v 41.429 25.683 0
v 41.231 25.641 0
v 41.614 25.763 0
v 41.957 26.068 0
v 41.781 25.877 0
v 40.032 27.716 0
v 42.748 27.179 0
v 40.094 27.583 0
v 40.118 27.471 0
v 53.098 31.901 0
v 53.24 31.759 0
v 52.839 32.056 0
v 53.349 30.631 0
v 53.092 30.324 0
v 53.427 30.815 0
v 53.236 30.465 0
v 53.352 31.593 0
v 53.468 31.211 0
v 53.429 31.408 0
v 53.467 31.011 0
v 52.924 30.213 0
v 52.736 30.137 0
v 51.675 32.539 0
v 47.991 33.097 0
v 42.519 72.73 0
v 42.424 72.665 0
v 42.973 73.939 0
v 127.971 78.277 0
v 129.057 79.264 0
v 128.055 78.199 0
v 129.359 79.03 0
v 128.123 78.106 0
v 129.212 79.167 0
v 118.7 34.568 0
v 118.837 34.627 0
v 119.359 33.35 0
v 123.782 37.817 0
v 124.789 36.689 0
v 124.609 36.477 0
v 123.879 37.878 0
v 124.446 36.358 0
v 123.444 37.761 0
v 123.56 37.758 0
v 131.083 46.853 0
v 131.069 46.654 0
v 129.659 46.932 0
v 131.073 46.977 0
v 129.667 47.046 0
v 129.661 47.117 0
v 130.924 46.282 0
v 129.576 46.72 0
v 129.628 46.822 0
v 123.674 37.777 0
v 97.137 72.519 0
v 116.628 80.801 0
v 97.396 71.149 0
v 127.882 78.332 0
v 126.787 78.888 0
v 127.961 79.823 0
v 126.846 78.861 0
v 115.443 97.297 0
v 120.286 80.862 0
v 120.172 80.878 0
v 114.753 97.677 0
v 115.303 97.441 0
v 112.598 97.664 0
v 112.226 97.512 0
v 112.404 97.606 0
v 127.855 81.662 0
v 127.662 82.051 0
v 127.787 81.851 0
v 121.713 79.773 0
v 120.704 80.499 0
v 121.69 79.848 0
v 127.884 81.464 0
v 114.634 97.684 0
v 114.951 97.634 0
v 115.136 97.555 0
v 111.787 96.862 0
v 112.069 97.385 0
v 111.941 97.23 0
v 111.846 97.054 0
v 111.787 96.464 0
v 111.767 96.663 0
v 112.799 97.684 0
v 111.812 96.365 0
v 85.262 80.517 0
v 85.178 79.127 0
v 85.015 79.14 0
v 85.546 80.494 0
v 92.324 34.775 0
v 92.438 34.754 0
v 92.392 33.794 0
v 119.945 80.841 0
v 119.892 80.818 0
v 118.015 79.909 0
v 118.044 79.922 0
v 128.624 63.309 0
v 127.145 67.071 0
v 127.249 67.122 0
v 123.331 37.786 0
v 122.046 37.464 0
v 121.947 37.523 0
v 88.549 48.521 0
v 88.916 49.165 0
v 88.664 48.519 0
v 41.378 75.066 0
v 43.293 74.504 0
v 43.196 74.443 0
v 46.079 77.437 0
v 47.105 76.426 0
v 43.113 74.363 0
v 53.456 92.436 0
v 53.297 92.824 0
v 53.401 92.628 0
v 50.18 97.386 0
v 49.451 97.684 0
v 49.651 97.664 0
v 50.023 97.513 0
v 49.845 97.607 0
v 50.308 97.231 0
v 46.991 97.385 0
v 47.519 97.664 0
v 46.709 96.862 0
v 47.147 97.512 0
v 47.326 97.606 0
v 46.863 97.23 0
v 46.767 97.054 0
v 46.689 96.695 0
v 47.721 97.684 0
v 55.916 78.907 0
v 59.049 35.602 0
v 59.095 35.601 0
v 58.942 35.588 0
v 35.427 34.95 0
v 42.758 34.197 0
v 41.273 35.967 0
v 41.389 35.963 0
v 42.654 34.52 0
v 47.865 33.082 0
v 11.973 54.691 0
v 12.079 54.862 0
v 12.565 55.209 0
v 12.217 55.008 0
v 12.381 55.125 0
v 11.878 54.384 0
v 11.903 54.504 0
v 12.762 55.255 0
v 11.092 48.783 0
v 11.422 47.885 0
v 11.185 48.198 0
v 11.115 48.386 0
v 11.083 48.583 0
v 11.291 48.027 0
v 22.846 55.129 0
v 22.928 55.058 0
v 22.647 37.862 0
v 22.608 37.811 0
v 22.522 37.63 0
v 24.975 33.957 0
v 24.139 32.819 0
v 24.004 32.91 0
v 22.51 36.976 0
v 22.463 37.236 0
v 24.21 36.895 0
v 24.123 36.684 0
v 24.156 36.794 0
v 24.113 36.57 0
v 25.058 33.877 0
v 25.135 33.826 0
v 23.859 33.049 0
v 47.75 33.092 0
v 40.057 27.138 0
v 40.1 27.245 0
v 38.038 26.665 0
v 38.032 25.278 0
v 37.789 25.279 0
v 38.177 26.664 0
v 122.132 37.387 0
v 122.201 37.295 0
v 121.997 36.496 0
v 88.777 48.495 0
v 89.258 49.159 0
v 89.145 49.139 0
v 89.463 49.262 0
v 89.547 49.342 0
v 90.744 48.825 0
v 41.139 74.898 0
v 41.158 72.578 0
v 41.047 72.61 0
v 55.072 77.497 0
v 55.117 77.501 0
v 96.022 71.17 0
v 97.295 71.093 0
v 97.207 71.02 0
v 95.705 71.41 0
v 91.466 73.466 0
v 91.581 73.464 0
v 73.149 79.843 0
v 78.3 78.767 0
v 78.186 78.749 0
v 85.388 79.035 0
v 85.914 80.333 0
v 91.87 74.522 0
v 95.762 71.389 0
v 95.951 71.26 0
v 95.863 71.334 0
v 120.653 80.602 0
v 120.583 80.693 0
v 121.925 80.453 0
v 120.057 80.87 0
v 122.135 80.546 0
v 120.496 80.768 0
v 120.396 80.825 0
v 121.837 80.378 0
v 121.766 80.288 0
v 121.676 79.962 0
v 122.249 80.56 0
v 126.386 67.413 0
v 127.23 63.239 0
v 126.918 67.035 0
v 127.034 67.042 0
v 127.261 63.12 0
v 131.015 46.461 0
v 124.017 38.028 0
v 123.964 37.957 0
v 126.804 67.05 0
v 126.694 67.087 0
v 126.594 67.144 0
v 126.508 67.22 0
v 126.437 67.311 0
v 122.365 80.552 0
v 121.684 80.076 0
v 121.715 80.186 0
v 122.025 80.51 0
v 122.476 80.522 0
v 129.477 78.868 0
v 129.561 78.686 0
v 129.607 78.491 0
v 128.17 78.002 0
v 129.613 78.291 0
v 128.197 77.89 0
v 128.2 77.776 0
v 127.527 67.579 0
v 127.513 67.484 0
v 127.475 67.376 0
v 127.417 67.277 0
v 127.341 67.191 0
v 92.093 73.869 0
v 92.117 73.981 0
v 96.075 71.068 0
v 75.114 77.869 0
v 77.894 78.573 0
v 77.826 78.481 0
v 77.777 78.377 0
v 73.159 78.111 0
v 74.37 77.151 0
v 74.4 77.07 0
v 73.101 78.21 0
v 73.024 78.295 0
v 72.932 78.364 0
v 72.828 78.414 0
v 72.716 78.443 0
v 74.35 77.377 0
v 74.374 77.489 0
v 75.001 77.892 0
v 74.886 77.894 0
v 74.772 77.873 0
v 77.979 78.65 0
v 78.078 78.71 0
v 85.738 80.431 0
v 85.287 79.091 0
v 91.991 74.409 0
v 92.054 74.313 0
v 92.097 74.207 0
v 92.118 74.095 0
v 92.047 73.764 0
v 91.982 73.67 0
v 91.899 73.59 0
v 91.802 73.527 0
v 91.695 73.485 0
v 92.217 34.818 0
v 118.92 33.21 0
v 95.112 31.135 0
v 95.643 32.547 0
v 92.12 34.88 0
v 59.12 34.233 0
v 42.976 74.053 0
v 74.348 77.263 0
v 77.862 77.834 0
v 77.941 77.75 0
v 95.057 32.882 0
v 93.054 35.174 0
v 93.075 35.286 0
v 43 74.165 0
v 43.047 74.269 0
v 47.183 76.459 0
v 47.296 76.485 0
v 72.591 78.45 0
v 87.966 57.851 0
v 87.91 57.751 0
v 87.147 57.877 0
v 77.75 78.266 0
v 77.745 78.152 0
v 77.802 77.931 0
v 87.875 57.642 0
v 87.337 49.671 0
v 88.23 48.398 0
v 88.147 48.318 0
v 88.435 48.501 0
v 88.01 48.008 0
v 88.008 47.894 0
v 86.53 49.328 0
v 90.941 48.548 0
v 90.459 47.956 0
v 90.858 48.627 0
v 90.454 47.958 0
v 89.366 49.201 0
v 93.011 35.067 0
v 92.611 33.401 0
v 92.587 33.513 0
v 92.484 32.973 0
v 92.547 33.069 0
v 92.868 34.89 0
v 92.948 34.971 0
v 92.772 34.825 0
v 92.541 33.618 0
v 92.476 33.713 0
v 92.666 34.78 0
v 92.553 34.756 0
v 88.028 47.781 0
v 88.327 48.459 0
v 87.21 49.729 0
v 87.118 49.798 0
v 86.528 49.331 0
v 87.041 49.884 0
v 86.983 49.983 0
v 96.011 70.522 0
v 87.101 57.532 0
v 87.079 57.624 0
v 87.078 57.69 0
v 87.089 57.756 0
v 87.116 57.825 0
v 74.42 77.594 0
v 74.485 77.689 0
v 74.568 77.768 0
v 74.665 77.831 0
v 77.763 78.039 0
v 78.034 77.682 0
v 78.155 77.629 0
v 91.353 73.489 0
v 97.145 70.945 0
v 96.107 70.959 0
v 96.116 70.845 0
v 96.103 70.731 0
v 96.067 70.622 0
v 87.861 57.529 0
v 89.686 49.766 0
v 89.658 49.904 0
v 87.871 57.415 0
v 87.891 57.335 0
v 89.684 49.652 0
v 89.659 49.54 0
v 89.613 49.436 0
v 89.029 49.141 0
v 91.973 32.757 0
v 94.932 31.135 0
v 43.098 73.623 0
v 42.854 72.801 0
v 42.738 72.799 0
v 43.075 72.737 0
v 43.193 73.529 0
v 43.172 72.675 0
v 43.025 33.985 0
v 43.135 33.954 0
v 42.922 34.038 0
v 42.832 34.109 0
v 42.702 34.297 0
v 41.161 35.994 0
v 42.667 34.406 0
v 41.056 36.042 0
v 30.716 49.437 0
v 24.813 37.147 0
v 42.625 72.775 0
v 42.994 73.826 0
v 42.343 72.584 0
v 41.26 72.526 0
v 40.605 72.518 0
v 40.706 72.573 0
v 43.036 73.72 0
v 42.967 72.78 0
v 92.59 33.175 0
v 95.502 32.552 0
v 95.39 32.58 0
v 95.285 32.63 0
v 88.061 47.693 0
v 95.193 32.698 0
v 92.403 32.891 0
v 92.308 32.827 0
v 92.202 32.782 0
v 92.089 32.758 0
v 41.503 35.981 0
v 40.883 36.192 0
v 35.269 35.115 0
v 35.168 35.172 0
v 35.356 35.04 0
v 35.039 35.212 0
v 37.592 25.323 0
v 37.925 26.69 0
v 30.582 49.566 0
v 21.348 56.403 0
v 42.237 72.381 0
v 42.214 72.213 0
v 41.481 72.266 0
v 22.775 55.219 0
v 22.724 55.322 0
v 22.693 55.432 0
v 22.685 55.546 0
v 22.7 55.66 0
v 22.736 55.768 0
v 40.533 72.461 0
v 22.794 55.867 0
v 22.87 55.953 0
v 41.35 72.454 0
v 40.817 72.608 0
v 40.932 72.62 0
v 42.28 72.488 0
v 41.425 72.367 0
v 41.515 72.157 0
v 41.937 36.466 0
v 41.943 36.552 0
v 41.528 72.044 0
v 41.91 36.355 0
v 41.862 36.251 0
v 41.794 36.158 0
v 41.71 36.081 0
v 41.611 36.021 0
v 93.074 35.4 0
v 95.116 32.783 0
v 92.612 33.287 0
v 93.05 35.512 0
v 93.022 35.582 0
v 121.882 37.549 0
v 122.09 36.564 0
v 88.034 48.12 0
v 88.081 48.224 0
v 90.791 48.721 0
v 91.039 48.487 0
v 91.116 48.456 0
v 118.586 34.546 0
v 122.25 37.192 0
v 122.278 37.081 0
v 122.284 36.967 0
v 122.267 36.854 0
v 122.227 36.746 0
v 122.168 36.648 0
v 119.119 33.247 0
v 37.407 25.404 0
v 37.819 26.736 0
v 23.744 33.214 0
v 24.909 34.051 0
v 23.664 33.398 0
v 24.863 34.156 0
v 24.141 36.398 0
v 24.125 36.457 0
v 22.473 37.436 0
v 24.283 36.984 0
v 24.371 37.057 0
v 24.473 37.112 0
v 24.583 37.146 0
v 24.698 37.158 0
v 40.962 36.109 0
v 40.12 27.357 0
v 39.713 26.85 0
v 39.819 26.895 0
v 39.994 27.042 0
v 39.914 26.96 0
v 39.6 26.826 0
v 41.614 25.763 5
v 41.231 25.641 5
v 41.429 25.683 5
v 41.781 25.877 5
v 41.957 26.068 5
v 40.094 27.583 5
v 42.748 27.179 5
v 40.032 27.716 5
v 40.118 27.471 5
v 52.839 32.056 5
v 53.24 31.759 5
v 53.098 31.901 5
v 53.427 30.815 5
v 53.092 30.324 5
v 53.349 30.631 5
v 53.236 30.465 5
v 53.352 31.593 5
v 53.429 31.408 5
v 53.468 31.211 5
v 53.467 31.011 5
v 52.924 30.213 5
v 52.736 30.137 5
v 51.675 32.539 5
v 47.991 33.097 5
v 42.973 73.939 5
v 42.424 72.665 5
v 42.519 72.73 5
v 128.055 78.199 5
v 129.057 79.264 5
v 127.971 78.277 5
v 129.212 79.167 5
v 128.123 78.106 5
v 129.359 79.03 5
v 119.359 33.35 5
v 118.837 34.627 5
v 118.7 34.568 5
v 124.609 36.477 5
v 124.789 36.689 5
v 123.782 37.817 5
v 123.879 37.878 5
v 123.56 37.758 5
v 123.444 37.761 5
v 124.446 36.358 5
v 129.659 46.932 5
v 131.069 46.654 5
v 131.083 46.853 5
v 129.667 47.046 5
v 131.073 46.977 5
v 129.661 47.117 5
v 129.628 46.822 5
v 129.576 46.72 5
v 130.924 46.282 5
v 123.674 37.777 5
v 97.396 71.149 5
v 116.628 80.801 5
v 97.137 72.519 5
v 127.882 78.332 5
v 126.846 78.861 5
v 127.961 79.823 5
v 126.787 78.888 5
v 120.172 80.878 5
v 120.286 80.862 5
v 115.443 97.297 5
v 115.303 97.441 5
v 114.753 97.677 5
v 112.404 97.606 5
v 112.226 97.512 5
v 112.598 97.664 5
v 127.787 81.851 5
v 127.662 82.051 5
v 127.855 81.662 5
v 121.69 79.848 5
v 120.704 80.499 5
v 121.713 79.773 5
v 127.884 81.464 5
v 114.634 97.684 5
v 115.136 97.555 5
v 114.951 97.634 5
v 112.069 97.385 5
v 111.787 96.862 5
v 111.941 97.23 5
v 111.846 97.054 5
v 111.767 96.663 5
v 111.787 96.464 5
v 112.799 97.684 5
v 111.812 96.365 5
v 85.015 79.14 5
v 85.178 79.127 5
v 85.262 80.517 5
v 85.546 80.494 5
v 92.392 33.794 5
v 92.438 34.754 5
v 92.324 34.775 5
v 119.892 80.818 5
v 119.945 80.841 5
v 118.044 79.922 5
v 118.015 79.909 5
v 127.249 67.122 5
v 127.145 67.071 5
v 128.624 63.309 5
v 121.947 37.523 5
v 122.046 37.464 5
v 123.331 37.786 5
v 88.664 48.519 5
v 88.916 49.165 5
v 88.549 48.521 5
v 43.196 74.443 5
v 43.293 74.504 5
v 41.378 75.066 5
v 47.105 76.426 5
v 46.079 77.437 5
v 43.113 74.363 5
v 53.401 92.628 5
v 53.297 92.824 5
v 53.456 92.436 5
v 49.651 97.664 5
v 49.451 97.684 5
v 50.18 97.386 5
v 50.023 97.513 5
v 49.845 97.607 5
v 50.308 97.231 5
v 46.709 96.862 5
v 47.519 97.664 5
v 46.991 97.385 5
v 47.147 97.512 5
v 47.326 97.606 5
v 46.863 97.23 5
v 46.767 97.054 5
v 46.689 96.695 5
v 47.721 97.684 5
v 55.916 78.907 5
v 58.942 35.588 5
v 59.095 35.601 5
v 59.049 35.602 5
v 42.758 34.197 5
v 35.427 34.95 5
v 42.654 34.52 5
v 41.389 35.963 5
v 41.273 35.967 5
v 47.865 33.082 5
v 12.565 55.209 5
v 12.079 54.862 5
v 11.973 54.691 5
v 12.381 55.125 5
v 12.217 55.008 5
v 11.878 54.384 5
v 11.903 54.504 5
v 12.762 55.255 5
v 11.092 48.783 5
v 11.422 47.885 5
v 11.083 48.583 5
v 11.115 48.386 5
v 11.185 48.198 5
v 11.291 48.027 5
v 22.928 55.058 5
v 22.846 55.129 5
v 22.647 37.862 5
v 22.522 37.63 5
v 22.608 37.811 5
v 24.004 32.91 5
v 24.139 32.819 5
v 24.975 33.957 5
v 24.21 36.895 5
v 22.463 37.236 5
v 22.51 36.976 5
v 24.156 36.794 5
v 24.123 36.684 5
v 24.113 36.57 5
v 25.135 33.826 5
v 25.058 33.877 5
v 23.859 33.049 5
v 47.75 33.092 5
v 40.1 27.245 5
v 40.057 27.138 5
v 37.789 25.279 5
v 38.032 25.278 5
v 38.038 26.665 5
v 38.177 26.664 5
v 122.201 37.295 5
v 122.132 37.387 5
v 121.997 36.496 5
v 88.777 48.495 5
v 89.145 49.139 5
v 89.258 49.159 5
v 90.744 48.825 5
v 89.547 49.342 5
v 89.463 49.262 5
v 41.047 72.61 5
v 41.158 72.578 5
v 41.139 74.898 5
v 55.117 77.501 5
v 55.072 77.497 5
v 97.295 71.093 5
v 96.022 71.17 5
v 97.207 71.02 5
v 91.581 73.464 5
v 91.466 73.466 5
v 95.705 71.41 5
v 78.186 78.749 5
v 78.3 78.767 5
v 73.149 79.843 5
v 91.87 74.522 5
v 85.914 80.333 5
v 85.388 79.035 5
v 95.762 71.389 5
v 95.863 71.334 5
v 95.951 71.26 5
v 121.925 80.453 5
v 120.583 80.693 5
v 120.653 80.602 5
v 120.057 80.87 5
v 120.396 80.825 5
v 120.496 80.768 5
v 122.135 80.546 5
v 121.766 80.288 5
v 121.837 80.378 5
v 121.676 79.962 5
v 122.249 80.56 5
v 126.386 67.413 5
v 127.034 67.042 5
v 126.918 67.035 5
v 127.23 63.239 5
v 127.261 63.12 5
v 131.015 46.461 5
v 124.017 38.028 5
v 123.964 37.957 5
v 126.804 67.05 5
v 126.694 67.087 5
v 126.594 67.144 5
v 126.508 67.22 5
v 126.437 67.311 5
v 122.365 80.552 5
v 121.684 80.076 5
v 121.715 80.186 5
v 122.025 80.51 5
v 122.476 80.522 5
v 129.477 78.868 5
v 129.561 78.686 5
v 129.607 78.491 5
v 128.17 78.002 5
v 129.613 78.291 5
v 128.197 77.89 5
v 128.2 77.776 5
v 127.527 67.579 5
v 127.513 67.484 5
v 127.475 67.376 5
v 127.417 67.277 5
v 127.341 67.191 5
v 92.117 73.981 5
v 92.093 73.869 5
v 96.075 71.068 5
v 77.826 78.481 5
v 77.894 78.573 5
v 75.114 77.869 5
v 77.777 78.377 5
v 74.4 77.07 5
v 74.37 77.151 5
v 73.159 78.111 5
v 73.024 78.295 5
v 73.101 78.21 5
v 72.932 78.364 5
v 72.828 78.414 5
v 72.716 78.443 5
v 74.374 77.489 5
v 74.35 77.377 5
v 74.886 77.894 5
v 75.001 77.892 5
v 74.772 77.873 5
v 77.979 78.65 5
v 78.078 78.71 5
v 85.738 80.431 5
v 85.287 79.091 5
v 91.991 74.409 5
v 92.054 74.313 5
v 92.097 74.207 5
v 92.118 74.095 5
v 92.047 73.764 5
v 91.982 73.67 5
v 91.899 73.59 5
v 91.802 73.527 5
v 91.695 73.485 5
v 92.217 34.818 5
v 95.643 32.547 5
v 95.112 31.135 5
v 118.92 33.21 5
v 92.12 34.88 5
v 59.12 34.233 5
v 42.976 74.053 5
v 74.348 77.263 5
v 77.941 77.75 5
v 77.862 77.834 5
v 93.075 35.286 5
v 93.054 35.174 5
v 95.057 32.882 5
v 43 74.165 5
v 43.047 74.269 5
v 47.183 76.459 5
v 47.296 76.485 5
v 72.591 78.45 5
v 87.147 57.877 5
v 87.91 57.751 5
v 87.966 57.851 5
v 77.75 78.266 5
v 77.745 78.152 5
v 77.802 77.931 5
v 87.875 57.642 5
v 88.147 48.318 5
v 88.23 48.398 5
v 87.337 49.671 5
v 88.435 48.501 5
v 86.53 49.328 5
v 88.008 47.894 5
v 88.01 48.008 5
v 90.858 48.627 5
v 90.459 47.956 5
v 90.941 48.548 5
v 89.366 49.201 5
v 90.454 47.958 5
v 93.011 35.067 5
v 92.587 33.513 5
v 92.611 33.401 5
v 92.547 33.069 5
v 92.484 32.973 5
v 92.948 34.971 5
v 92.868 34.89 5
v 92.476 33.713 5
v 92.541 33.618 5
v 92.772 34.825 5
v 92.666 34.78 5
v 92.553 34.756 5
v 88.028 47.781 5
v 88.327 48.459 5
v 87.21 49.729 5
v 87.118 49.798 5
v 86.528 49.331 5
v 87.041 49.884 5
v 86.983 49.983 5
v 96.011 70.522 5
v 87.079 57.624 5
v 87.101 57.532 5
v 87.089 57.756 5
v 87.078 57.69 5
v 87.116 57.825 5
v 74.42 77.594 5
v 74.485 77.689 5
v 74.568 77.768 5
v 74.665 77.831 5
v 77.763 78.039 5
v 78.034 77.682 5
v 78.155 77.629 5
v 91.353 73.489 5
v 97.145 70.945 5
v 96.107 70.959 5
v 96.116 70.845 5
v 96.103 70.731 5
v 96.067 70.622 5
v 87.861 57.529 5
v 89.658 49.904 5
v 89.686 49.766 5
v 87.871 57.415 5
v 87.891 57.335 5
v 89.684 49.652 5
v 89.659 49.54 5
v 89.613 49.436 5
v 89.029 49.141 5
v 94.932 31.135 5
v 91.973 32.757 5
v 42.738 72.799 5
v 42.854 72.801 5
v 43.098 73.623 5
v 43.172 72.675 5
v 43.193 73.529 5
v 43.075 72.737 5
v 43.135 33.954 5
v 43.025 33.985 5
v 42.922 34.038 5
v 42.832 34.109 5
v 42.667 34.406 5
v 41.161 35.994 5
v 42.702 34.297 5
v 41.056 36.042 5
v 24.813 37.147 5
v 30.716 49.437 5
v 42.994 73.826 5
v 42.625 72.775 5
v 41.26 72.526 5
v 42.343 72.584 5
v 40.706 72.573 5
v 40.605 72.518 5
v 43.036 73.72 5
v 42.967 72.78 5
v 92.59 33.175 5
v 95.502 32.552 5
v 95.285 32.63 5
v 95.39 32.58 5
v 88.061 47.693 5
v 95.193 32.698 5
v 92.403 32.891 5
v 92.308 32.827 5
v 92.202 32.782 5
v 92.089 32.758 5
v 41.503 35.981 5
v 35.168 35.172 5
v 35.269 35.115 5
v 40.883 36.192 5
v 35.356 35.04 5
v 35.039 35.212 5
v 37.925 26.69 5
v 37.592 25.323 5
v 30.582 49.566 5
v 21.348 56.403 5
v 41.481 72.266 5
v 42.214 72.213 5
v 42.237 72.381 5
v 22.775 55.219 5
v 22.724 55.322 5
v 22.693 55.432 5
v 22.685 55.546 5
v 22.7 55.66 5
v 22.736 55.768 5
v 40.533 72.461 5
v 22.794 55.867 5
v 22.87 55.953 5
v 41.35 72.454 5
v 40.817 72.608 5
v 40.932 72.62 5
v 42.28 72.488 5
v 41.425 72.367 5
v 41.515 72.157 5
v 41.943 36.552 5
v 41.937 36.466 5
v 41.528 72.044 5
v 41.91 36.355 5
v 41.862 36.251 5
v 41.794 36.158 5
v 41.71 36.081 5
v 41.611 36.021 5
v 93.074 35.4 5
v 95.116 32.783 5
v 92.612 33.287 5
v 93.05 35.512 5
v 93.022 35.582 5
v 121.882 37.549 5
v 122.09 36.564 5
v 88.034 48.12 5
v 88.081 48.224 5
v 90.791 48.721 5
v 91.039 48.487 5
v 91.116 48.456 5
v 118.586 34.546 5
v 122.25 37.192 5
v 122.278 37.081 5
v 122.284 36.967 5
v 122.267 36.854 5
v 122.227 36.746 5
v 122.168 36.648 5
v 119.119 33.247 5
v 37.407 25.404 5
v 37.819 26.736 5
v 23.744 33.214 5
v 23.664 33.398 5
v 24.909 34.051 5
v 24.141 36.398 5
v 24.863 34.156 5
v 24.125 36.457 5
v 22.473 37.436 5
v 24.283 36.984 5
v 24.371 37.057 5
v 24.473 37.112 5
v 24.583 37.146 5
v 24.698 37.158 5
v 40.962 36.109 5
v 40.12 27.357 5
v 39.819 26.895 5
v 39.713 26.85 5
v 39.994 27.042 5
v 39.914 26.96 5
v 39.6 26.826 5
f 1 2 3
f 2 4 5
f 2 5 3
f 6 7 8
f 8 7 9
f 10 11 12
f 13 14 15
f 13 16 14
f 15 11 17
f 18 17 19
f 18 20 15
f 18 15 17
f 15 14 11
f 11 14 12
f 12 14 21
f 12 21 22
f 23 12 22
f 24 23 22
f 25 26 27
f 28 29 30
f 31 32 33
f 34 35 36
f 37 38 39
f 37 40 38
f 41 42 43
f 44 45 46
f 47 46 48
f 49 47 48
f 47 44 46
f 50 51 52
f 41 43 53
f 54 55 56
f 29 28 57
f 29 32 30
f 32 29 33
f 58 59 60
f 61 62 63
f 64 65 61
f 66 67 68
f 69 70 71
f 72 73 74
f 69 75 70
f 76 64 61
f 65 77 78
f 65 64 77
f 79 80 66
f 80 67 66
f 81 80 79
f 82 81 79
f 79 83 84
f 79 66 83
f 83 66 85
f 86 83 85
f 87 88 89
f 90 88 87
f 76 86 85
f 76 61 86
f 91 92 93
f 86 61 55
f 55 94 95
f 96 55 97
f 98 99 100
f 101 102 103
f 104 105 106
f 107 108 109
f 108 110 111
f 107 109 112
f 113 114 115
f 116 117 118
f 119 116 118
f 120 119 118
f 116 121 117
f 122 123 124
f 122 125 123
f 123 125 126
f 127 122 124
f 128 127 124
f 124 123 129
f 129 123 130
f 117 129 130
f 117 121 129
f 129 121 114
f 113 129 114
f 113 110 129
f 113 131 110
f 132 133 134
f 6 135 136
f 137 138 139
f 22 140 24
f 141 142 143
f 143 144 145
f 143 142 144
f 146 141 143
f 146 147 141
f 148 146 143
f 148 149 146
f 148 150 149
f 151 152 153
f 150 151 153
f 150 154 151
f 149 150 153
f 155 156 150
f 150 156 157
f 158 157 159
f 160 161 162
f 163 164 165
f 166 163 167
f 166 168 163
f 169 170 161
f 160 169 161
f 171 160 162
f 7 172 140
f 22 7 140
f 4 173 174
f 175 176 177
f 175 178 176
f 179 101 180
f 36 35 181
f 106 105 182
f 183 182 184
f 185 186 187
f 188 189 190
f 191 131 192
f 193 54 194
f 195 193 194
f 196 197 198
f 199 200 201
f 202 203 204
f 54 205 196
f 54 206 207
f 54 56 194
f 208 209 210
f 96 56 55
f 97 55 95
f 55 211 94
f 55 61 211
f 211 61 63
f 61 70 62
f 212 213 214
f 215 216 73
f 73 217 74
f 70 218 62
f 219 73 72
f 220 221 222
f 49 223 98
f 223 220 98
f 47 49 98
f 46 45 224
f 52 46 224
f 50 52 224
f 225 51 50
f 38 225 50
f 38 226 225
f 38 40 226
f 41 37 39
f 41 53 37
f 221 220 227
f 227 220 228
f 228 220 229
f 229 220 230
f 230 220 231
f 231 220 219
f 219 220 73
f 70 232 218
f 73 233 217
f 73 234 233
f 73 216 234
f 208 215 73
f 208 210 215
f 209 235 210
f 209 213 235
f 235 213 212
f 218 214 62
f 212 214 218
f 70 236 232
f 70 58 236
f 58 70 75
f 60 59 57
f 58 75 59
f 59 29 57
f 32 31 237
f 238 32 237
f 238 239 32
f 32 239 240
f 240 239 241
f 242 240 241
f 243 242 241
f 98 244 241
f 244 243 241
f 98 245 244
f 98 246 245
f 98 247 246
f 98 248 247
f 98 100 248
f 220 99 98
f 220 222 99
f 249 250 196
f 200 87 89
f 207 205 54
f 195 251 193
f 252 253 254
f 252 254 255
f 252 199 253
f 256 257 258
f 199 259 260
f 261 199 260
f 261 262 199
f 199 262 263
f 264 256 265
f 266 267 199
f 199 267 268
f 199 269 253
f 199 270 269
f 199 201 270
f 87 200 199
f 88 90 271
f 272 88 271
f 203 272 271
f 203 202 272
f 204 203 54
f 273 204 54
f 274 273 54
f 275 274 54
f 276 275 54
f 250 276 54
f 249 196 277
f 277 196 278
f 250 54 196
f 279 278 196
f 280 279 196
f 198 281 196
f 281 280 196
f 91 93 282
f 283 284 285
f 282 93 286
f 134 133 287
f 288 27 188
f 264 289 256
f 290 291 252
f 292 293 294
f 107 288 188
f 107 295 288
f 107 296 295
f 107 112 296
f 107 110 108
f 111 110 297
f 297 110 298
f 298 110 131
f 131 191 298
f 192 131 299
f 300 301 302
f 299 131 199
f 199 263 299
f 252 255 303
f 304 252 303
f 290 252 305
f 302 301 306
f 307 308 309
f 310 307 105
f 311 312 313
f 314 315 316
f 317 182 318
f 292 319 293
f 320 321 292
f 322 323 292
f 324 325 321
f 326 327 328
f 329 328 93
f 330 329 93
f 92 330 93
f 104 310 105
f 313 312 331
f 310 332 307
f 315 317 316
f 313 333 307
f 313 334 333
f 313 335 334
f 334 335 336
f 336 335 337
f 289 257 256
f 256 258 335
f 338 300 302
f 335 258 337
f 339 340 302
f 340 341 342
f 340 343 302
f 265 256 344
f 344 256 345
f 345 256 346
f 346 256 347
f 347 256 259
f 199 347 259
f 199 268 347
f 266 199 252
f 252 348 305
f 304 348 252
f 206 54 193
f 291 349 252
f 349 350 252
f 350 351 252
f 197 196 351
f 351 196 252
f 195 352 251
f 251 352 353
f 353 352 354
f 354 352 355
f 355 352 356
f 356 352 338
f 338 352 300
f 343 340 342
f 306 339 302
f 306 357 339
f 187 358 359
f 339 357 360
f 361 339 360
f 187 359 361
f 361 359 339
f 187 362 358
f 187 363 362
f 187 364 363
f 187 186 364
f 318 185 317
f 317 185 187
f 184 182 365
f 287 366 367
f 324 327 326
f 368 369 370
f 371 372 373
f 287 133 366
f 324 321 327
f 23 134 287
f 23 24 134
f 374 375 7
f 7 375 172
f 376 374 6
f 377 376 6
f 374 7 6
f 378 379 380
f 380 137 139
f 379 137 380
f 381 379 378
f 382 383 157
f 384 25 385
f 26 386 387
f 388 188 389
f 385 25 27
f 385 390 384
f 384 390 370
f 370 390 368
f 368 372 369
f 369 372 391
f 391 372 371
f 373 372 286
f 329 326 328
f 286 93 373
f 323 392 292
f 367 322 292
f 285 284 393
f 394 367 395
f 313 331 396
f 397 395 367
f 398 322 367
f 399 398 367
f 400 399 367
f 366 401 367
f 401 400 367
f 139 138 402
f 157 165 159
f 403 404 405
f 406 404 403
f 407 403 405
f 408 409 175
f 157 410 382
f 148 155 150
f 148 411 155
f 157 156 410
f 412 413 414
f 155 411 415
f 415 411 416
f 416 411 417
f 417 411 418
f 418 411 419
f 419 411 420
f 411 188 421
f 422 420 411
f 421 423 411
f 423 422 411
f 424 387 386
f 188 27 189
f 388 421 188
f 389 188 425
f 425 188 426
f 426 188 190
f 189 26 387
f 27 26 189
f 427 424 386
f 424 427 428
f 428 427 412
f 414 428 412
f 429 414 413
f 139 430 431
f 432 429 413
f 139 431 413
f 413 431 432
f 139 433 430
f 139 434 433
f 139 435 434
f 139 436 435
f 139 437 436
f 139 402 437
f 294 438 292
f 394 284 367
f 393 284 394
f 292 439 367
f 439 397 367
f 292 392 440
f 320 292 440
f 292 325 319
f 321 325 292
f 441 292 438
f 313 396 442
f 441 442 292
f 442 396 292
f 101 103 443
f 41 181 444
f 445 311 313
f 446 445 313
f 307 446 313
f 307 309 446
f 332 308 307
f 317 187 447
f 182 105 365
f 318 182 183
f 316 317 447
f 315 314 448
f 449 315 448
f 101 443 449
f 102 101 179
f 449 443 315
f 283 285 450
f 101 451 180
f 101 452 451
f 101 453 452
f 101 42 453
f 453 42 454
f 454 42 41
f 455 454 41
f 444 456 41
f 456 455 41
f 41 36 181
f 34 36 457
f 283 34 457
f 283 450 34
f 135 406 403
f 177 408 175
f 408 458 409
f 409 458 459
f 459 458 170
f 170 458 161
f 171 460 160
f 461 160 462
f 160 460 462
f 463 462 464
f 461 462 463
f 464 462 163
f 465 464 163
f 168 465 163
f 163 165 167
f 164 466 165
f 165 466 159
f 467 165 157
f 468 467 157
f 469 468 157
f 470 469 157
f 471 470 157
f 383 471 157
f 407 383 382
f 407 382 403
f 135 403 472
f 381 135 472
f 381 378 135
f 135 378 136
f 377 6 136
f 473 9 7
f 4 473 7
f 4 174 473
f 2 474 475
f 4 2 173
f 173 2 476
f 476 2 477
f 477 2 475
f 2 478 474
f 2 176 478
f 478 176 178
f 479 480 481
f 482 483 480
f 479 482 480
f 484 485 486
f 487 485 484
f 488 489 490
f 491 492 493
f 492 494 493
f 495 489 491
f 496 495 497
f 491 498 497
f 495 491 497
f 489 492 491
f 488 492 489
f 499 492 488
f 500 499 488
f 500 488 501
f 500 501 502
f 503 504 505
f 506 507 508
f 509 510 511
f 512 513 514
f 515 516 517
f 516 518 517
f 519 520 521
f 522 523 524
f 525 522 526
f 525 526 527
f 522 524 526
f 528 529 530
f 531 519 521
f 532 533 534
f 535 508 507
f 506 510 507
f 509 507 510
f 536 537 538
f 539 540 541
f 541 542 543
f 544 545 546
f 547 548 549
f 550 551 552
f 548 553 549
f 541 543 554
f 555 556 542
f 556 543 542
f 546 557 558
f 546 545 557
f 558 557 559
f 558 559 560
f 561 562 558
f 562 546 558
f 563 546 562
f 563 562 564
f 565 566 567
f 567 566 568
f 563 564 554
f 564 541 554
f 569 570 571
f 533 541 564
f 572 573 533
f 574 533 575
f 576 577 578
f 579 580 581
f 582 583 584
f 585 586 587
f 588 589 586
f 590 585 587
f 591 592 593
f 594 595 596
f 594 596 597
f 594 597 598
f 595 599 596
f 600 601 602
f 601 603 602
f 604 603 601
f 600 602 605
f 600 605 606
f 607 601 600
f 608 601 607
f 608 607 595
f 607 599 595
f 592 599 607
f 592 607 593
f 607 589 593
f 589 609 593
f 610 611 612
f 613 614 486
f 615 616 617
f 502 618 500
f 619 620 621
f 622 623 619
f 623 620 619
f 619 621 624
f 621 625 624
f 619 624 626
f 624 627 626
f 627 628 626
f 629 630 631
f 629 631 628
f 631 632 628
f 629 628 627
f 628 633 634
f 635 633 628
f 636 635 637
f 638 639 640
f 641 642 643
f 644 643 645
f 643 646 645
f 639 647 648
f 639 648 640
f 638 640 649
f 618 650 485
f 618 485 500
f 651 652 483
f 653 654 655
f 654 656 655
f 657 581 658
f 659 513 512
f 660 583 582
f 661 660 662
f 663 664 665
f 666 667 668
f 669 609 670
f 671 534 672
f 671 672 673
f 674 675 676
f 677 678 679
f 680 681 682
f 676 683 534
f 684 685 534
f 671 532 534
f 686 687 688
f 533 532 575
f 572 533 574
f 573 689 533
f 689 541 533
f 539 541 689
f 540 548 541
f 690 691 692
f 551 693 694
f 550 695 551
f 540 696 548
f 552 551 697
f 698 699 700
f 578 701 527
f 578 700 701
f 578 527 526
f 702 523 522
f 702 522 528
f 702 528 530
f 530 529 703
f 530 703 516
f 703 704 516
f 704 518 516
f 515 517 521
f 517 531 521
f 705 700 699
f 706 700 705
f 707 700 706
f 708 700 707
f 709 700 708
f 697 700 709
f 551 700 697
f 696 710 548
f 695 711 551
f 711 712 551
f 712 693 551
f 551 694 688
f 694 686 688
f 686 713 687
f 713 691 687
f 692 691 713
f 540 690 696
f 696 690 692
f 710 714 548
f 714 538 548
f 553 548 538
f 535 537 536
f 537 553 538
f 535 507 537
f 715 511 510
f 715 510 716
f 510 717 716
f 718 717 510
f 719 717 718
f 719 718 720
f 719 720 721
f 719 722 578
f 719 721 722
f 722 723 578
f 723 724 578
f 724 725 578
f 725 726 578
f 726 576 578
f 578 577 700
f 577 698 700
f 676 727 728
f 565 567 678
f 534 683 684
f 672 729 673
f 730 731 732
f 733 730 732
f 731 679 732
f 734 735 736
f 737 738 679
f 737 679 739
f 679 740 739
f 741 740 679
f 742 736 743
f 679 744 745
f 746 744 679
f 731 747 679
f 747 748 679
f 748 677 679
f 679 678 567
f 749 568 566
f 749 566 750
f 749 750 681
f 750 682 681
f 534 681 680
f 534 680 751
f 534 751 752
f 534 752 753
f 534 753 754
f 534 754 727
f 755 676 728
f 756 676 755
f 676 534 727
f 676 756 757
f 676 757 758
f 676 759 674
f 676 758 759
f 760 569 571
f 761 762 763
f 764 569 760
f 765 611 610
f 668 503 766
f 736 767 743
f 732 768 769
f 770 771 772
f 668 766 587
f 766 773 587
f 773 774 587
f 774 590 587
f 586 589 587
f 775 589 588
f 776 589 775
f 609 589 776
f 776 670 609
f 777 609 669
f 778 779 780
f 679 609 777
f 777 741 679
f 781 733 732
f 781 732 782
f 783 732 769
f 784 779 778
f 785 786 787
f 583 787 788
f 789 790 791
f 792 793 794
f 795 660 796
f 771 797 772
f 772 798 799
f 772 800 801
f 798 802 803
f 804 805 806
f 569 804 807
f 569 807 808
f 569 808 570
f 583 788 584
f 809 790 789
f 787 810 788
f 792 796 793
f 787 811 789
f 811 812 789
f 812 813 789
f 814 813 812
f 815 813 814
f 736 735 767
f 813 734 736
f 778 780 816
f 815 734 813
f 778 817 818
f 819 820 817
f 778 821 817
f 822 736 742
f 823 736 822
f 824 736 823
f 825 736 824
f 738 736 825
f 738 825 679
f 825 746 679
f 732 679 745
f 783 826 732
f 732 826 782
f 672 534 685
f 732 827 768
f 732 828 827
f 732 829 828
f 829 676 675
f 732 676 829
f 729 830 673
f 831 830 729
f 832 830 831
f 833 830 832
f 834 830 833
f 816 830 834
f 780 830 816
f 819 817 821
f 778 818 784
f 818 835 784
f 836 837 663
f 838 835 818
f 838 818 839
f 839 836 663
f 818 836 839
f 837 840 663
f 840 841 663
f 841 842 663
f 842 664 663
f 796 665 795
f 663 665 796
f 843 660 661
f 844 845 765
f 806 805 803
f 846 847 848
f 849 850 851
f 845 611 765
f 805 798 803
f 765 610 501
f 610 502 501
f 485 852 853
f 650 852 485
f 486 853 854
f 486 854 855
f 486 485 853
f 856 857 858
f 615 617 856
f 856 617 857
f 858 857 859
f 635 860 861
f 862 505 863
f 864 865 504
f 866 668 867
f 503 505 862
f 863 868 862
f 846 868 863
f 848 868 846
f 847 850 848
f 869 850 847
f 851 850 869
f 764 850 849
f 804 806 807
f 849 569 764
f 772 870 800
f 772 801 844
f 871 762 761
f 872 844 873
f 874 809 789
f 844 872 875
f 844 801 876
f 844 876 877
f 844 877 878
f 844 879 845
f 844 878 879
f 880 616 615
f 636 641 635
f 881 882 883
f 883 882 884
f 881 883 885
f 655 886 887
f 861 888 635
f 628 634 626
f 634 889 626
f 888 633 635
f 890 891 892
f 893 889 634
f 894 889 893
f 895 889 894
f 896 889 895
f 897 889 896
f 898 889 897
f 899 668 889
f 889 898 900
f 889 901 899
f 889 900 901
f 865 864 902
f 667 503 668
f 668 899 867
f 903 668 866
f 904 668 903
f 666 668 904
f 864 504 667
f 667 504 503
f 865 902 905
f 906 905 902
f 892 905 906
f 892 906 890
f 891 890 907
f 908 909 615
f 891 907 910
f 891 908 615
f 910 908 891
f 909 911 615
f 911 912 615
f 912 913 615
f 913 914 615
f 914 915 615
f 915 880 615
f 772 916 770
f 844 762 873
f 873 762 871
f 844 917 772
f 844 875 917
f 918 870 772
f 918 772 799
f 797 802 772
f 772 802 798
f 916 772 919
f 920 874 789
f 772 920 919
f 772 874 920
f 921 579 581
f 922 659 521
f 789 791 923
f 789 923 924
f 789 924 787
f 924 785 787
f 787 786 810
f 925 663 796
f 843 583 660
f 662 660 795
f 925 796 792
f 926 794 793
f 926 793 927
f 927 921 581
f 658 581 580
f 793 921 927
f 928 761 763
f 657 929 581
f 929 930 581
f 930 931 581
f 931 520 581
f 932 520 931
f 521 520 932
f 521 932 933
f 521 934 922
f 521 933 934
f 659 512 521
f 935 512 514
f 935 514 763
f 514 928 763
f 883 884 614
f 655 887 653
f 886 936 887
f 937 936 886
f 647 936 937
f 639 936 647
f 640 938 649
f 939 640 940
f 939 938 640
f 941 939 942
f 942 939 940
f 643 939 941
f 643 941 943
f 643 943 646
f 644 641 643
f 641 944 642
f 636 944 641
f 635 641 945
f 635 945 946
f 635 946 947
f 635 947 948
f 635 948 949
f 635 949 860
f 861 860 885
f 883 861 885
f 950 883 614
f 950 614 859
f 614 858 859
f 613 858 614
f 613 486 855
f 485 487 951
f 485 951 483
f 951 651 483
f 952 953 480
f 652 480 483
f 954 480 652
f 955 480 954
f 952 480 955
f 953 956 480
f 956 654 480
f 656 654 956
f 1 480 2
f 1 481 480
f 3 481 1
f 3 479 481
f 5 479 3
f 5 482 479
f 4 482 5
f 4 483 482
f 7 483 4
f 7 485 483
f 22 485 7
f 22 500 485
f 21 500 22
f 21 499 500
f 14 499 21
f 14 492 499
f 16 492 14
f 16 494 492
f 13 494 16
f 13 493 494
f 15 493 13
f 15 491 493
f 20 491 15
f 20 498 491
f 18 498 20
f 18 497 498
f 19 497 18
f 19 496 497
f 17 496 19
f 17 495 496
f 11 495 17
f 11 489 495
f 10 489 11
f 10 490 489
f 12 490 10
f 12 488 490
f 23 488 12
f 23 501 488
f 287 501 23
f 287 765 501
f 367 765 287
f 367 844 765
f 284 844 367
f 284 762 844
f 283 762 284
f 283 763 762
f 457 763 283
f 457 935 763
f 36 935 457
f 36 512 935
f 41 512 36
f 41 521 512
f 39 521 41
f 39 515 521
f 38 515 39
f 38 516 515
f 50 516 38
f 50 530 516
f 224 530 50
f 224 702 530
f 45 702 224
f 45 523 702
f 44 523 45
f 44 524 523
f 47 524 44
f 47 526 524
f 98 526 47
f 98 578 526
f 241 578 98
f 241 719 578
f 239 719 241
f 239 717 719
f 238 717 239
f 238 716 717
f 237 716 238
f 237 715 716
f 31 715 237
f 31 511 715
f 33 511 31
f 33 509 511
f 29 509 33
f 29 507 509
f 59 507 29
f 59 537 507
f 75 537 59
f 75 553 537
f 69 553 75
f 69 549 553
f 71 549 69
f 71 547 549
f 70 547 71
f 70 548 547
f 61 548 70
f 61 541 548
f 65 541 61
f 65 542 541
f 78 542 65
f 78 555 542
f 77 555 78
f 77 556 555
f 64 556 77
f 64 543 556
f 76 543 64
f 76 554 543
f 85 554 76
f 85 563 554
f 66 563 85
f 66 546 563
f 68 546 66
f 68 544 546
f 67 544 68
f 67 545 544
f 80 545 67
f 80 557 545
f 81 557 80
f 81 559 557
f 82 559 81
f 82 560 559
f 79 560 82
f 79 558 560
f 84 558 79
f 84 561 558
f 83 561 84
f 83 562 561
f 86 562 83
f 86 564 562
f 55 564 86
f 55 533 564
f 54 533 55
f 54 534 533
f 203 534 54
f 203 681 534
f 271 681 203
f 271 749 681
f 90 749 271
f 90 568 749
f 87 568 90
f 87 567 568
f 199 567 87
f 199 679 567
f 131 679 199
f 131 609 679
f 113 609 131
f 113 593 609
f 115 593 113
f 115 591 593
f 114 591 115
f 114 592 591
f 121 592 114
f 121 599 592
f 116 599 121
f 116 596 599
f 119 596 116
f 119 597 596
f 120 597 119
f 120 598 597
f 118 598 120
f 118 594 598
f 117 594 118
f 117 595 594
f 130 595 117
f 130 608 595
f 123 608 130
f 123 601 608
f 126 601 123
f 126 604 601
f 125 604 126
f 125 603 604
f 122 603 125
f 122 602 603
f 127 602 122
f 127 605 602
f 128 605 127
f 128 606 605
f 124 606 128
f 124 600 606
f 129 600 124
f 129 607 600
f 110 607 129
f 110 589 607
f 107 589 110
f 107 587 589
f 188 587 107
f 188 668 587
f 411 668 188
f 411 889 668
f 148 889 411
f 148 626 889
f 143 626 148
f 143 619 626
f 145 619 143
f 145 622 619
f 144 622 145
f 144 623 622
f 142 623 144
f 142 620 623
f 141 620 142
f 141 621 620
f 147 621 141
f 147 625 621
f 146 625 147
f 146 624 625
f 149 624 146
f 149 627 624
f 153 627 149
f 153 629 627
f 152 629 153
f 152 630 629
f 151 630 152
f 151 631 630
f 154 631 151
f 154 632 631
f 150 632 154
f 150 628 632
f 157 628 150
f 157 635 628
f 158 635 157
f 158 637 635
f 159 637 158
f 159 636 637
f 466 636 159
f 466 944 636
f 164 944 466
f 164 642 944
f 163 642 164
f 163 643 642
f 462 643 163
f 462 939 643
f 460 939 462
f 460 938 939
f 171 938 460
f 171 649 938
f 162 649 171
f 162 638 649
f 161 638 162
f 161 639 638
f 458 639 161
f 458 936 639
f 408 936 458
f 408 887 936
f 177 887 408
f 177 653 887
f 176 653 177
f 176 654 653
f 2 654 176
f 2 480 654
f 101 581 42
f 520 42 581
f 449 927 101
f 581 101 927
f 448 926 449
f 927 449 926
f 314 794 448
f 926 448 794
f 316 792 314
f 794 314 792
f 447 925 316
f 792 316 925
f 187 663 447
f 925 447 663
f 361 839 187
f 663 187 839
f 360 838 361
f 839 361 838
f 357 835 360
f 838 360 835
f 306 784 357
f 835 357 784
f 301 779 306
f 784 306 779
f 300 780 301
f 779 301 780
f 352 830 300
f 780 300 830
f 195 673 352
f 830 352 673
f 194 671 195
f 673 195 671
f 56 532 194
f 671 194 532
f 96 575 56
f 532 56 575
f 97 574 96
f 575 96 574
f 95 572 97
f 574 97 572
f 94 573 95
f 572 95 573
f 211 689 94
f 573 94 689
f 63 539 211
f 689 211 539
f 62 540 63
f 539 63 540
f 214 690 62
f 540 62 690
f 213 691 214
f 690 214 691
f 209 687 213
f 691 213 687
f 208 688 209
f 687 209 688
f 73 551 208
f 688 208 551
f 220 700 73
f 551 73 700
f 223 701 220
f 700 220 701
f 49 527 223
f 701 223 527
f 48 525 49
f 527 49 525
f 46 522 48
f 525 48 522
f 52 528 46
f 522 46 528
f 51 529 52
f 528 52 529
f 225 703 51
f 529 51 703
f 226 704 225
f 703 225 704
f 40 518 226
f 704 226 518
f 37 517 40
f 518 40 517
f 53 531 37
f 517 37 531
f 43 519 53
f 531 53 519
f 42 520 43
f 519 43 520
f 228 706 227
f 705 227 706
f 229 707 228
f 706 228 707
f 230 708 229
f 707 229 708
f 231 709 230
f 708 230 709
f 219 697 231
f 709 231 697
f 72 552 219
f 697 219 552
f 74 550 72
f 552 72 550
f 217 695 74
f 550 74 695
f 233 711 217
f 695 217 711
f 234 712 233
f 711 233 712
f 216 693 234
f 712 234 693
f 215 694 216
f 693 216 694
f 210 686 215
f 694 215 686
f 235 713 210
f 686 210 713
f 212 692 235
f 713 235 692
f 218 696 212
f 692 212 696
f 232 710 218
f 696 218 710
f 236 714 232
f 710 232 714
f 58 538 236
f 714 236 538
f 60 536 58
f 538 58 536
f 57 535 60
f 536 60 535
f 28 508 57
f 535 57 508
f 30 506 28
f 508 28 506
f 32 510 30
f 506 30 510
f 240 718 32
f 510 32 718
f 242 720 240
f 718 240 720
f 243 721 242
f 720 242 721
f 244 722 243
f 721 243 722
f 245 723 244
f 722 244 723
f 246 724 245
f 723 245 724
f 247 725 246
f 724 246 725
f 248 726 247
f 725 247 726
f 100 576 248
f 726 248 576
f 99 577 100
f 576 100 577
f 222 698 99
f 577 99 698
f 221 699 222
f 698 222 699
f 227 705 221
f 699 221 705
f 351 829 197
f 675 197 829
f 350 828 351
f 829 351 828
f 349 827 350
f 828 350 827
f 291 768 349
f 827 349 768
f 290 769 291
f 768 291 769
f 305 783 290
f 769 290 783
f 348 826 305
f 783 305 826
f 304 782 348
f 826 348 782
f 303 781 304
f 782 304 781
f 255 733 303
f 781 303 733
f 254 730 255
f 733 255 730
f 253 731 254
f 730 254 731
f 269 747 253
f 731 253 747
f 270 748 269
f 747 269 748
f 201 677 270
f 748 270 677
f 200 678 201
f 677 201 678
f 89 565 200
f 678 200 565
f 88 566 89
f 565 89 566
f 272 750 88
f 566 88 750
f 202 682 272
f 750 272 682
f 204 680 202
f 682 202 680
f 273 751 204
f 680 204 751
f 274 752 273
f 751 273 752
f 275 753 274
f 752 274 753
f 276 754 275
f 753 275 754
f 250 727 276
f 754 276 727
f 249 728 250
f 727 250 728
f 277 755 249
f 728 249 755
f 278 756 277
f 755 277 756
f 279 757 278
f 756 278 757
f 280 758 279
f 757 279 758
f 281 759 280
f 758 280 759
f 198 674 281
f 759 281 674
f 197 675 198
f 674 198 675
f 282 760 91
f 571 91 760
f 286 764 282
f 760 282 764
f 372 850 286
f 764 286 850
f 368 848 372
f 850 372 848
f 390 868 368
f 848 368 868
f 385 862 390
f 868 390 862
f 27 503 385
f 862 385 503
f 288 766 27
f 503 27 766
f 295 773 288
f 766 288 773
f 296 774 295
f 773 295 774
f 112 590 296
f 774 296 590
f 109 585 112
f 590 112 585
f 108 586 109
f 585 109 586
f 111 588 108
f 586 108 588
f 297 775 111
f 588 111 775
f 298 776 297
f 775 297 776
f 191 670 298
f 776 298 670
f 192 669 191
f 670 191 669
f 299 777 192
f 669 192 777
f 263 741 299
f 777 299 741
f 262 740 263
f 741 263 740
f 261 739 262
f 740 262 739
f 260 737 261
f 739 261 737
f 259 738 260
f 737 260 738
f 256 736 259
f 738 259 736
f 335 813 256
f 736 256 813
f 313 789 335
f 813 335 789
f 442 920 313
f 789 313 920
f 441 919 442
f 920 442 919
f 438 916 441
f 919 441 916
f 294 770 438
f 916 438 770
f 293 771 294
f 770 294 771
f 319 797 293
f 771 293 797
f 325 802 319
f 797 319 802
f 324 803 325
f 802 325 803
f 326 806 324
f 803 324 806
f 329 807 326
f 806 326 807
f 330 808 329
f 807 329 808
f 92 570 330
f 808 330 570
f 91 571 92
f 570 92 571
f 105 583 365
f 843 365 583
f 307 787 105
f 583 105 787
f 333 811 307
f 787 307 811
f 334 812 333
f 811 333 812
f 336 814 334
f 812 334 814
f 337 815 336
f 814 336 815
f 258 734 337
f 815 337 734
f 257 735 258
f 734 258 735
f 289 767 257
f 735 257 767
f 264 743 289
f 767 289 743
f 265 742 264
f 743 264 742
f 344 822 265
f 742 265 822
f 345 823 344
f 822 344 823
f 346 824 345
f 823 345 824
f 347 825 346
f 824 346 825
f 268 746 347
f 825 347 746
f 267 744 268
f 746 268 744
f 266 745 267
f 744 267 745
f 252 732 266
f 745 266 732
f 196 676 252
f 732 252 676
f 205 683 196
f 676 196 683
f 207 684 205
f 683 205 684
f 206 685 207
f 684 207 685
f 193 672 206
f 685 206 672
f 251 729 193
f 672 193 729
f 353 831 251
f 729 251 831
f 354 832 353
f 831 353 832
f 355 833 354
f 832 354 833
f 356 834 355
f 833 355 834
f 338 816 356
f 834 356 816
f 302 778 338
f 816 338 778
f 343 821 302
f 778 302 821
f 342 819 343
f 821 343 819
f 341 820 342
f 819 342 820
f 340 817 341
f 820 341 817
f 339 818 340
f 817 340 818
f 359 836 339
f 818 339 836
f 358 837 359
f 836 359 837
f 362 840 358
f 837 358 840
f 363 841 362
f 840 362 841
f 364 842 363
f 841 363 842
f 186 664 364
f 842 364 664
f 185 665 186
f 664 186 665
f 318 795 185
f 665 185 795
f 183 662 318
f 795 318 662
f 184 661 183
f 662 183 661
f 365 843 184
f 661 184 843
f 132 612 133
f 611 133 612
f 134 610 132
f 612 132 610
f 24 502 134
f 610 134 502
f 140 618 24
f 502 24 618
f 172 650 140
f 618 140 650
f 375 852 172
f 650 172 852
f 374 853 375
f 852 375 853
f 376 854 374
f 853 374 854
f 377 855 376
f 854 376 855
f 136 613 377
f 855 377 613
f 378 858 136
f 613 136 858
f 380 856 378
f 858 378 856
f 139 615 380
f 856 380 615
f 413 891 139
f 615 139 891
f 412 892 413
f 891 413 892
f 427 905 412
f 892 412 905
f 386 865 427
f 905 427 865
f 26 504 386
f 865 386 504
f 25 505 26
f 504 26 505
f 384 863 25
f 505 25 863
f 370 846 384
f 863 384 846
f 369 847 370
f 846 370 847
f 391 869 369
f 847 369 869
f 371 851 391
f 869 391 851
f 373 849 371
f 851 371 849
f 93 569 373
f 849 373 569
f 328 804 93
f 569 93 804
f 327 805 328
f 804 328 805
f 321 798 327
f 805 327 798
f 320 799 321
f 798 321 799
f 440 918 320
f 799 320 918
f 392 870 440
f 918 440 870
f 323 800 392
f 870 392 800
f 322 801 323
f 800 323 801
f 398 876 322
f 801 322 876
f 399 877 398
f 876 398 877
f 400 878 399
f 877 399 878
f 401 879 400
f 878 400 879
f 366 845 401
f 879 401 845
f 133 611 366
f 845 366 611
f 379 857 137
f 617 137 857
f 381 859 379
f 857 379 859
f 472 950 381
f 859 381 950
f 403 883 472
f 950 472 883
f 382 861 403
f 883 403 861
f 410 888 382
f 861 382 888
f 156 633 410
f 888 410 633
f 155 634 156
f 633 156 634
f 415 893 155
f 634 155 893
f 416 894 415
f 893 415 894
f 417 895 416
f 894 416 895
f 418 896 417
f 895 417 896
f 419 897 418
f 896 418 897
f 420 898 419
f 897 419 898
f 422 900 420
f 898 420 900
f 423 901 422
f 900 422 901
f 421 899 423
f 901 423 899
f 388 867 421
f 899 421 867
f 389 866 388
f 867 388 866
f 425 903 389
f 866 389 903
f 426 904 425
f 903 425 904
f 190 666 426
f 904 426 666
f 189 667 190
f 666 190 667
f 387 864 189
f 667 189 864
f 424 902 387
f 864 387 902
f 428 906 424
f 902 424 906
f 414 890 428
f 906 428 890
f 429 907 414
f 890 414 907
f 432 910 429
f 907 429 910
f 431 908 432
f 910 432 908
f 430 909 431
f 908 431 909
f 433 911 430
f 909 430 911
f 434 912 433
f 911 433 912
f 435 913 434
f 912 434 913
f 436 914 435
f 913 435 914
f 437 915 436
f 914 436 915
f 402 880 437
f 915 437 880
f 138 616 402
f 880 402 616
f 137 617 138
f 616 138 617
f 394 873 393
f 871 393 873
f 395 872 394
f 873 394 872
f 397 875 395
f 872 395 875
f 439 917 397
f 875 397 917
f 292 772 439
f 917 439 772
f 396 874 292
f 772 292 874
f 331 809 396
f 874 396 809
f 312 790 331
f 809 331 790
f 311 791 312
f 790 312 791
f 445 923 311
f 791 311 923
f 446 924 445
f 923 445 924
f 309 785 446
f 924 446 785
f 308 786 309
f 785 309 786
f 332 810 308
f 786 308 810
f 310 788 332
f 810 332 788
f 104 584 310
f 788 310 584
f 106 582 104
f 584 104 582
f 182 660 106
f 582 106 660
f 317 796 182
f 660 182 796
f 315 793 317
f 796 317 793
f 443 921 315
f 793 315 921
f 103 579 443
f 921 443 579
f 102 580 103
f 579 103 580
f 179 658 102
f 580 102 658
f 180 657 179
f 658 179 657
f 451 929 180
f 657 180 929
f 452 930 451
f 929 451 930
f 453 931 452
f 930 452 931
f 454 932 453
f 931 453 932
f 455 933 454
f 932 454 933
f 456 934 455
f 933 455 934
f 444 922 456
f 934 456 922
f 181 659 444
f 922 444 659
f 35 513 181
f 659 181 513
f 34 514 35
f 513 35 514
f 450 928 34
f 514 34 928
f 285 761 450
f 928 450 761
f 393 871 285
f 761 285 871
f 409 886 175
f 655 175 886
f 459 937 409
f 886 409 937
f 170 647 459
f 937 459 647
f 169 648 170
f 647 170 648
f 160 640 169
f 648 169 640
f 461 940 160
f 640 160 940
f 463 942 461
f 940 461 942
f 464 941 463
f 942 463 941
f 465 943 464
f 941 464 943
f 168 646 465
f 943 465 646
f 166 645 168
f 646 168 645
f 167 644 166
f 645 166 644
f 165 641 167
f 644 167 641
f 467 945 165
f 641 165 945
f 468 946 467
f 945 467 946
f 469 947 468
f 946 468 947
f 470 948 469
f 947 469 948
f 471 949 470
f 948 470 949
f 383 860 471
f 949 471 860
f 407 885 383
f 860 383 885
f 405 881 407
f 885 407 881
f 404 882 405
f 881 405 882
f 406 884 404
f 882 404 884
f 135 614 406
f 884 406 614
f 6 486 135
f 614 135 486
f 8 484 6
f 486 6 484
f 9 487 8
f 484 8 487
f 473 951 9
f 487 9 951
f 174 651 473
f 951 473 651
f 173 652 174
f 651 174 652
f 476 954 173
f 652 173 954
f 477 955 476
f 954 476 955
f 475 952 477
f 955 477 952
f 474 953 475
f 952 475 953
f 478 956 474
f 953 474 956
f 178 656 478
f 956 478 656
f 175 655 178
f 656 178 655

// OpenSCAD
/*
 * Customizable Origami - Sheep - https://www.thingiverse.com/thing:2679929
 * by Dennis Hofmann - https://www.thingiverse.com/mightynozzle/about
 * created 2017-11-30
 * version v1.0
 *
 * Changelog
 * --------------
 * v1.0:
 *      - final design
 * --------------
 * 
 * This work is licensed under the Creative Commons - Attribution - NonCommercial - ShareAlike license.
 * https://creativecommons.org/licenses/by-nc-sa/3.0/
 */


 // Parameter Section //
//-------------------//

// preview[view:north, tilt:top]

// The maximum size of the longest side. The shorter side will be automatically resized in same ratio.
max_size_in_millimeter = 120; //[20:300]

// The height of the model.
model_height_in_millimeter = 5; //[0.2:0.2:100]

// Thickness of the outer outline.
outline_size_in_millimeter = 1.4; //[0.5:0.1:20]

// Thickness of the inner outline.
inline_size_in_millimeter = 0.7; //[0.5:0.1:20]

// Roundiness of the ends of the inner outlines.
inline_edge_radius_in_millimeter = 0.6; //[0.0:0.1:5]

// Flip model
flip_model = "no"; //[yes,no]

/*[hidden]*/
max_size = max_size_in_millimeter;
model_height = model_height_in_millimeter;
$fn=32;

// Outer Points
A1 = [231, 938];
A2 = [468, 724];
A3 = [448, 719];
A4 = [470, 650];
A5 = [723, 507];
A6 = [784, 514];
A7 = [803, 541];
A8 = [1000, 600];
A9 = [938, 626];
A10 = [913, 631];
A11 = [1126, 680];
A12 = [1812, 620];
A13 = [2266, 660];
A14 = [2363, 718];
A15 = [2480, 903];
A16 = [2433, 1220];
A17 = [2452, 1511];
A18 = [2421, 1527];
A19 = [2419, 1570];
A20 = [2186, 1864];
A21 = [2151, 1864];
A22 = [2248, 1547];
A27 = [1850, 1376];
A28 = [1627, 1533];
A29 = [1396, 1520];
A30 = [1050, 1501];
A35 = [1000, 1779];
A36 = [943, 1864];
A37 = [910, 1864];
A38 = [898, 1481];
A39 = [798, 1430];
A40 = [416, 1069];
A41 = [246, 1046];

outline = [A1, A2, A3, A4, A5, A6, A7, A8, A9, A10, A11, A12, A13, A14, A15, A16, A17, A18, A19, A20, A21, A22, A27, A28, A29, A30, A35, A36, A37, A38, A39, A40, A41];

// Inner Points
B1 = [1667, 1112];
B2 = [1727, 931];
B3 = [1656, 954];
B4 = [2301, 1573];
B5 = [807, 651];
B6 = [677, 684];
B7 = [580, 950];
//B8 = [1130, 1501];

// Polygons
C1 = [A3, A4, A5, A6, B6, A2];
C2 = [A40, B7, B5, A39];
C3 = [B5, A10, A11, A12, A39];
C4 = [A39, A38, A30, A29, B3, A12];
C5 = [B3, A12, A13, A14, B2];
C6 = [B3, B2, B1, A27, A29];
C7 = [B2, A14, A15, A16, B4, A22, A27, B1];
C8 = [A16, A17, A18, B4];
C9 = [A27, A29, A28];

cut_polygons = [C1, C2, C3, C4, C5, C6, C7, C8, C9];

min_x = A1[0];
min_y = A5[1];
max_x = A15[0];
max_y = A36[1];

x_size = max_x - min_x;
y_size = max_y - min_y;

x_factor = max_size / x_size;
y_factor = max_size / y_size;

inline_size = x_size > y_size ? inline_size_in_millimeter / x_factor / 2: inline_size_in_millimeter / y_factor / 2;
inline_edge_radius = x_size > y_size ? inline_edge_radius_in_millimeter / x_factor: inline_edge_radius_in_millimeter / y_factor;
outline_size = x_size > y_size ? outline_size_in_millimeter / x_factor - inline_size: outline_size_in_millimeter / y_factor - inline_size;


 // Program Section //
//-----------------//

if(x_size > y_size) {
    resize(newsize=[max_size, x_factor * y_size, model_height]){
        if(flip_model == "yes") {
            mirror([0,1,0]) {
                rotate([180,180,0]) {    
                    create(outline, cut_polygons);
                }
            }
        } else {
            create(outline, cut_polygons);
        }
    }
} else {
    resize(newsize=[y_factor * x_size, max_size, model_height]){
        if(flip_model == "yes") {
            mirror([0,1,0]) {
                rotate([180,180,0]) {    
                    create(outline, cut_polygons);
                }
            }
        } else {
            create(outline, cut_polygons);
        }
    }
}


 // Module Section //
//----------------//

module create() {
    linear_extrude(height=1) {
        difference() {
            offset(r = -0) {
                offset(r = +outline_size) {
                    polygon(points = outline, convexity = 10);
                }
            }
            
            for(cut_polygon = [0:len(cut_polygons)]) {
                offset(r = +inline_edge_radius) {
                    offset(r = -inline_size - inline_edge_radius) {
                        polygon(points = cut_polygons[cut_polygon], convexity = 10);
                    }
                }
            }
        }
    }
}
